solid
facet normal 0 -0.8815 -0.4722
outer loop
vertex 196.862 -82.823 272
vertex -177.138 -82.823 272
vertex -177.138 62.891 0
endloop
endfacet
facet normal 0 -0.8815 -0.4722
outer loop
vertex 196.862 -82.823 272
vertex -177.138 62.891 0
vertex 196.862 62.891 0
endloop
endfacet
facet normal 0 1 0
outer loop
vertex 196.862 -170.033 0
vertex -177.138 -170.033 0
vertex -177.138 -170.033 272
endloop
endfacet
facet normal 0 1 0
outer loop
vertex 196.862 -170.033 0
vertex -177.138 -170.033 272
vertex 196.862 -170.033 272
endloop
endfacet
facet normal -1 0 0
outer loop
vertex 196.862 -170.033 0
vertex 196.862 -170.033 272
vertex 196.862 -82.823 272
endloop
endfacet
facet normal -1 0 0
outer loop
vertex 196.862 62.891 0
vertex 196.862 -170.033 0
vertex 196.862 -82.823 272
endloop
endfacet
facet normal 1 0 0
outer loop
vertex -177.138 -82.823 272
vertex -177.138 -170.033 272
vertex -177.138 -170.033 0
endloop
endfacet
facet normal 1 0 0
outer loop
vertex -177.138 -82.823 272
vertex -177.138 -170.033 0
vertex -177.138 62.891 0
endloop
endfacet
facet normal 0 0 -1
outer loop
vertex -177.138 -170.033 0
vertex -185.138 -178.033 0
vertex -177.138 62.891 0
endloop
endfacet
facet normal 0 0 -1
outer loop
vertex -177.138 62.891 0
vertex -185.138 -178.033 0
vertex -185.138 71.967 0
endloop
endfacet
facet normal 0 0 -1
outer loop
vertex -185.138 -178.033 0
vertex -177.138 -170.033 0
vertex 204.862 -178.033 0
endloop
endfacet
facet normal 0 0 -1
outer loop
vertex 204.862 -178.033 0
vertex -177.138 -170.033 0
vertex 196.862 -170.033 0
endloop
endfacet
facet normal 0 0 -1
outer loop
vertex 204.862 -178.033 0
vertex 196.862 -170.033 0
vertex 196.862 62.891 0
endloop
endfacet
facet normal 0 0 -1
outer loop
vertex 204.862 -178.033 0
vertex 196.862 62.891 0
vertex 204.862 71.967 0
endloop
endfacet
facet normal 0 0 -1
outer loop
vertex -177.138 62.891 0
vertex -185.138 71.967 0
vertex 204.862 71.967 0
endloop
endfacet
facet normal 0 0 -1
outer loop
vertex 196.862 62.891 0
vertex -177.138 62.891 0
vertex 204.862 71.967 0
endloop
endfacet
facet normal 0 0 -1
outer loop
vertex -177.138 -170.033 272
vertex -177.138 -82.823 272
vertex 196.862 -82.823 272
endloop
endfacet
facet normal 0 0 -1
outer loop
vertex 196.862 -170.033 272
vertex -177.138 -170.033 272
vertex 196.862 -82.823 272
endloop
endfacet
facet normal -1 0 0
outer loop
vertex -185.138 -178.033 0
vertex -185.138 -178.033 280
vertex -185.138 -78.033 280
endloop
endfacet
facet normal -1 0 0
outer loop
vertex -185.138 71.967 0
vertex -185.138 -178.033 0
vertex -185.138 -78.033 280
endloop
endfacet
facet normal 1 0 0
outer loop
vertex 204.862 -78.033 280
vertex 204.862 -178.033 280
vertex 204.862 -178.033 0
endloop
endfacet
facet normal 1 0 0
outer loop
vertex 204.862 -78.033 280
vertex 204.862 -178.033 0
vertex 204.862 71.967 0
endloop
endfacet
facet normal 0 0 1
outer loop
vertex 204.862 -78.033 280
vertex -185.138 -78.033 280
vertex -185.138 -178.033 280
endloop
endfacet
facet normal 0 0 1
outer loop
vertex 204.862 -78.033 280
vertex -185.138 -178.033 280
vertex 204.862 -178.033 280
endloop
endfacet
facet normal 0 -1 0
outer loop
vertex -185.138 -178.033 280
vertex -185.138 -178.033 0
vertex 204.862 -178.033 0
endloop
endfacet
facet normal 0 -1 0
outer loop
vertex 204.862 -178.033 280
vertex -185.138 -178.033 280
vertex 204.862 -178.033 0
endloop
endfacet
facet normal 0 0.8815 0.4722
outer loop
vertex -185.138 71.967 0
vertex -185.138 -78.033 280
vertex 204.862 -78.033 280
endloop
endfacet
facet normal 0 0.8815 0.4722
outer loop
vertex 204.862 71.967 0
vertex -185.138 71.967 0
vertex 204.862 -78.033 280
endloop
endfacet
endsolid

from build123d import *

# Parameters (mm, degrees)
F4_W     = 390
F4_H     = 250
F5_DEPTH = 280
F6_SIZE2 = 149.99999
F6_SIZE  = 279.99999
F7_T     = 8


# Not quite as in the source:
# - a fillet or chamfer is up to 0.001 mm smaller than in the source, because OpenCascade refuses the exact size
# - a shell that OpenCascade refuses in one call is made with other operations: the cavity is built on its own and cut out


with BuildPart() as f5:
    # F4 (on Top) → F5 (new body)
    with BuildSketch(Plane.XY):
        with Locations((9.861856699, -53.0331014672)):
            Rectangle(F4_W, F4_H)
    extrude(amount=F5_DEPTH)

    # F6 (size 280 and 150 in the source; OpenCascade refuses exactly that, so slightly less here)
    f6_edges = [f5.edges().sort_by_distance(p)[0] for p in [
        (9.861857, 71.966899, 280),
    ]]
    f6_side = f5.faces().sort_by_distance((9.861857, 71.966899, 140))[0]
    chamfer(f6_edges, length=F6_SIZE, length2=F6_SIZE2, reference=f6_side)

    # F7: shell of thickness 8, made by hand


with BuildPart() as f7_core1:
    # F7_t2: copy of F5
    add(f5.part)

    # the walls: a layer under each face that stays
    f7_faces = [f7_core1.faces().sort_by_distance(p)[0] for p in [
        (-185.138143301, -53.0331014672, 140),
        (9.861856699, 71.9668985328, 5e-06),
        (9.861856699, -3.0330964672, 140.000005),
        (9.861856699, -128.0330964672, 280),
        (9.861856699, -178.0331014672, 140),
        (204.861856699, -53.0331014672, 140),
    ]]
    thicken(f7_faces, amount=-F7_T, mode=Mode.SUBTRACT)


with BuildPart() as f5_1:
    add(f5.part)

    # what is left inside the walls is the cavity
    f7_cavity = [f7_core1.part.solids().sort_by_distance(p)[0] for p in [
        (9.861857, 14.249313, 90.628889),
    ]]
    add(f7_cavity, mode=Mode.SUBTRACT)


solid = f5_1.part
